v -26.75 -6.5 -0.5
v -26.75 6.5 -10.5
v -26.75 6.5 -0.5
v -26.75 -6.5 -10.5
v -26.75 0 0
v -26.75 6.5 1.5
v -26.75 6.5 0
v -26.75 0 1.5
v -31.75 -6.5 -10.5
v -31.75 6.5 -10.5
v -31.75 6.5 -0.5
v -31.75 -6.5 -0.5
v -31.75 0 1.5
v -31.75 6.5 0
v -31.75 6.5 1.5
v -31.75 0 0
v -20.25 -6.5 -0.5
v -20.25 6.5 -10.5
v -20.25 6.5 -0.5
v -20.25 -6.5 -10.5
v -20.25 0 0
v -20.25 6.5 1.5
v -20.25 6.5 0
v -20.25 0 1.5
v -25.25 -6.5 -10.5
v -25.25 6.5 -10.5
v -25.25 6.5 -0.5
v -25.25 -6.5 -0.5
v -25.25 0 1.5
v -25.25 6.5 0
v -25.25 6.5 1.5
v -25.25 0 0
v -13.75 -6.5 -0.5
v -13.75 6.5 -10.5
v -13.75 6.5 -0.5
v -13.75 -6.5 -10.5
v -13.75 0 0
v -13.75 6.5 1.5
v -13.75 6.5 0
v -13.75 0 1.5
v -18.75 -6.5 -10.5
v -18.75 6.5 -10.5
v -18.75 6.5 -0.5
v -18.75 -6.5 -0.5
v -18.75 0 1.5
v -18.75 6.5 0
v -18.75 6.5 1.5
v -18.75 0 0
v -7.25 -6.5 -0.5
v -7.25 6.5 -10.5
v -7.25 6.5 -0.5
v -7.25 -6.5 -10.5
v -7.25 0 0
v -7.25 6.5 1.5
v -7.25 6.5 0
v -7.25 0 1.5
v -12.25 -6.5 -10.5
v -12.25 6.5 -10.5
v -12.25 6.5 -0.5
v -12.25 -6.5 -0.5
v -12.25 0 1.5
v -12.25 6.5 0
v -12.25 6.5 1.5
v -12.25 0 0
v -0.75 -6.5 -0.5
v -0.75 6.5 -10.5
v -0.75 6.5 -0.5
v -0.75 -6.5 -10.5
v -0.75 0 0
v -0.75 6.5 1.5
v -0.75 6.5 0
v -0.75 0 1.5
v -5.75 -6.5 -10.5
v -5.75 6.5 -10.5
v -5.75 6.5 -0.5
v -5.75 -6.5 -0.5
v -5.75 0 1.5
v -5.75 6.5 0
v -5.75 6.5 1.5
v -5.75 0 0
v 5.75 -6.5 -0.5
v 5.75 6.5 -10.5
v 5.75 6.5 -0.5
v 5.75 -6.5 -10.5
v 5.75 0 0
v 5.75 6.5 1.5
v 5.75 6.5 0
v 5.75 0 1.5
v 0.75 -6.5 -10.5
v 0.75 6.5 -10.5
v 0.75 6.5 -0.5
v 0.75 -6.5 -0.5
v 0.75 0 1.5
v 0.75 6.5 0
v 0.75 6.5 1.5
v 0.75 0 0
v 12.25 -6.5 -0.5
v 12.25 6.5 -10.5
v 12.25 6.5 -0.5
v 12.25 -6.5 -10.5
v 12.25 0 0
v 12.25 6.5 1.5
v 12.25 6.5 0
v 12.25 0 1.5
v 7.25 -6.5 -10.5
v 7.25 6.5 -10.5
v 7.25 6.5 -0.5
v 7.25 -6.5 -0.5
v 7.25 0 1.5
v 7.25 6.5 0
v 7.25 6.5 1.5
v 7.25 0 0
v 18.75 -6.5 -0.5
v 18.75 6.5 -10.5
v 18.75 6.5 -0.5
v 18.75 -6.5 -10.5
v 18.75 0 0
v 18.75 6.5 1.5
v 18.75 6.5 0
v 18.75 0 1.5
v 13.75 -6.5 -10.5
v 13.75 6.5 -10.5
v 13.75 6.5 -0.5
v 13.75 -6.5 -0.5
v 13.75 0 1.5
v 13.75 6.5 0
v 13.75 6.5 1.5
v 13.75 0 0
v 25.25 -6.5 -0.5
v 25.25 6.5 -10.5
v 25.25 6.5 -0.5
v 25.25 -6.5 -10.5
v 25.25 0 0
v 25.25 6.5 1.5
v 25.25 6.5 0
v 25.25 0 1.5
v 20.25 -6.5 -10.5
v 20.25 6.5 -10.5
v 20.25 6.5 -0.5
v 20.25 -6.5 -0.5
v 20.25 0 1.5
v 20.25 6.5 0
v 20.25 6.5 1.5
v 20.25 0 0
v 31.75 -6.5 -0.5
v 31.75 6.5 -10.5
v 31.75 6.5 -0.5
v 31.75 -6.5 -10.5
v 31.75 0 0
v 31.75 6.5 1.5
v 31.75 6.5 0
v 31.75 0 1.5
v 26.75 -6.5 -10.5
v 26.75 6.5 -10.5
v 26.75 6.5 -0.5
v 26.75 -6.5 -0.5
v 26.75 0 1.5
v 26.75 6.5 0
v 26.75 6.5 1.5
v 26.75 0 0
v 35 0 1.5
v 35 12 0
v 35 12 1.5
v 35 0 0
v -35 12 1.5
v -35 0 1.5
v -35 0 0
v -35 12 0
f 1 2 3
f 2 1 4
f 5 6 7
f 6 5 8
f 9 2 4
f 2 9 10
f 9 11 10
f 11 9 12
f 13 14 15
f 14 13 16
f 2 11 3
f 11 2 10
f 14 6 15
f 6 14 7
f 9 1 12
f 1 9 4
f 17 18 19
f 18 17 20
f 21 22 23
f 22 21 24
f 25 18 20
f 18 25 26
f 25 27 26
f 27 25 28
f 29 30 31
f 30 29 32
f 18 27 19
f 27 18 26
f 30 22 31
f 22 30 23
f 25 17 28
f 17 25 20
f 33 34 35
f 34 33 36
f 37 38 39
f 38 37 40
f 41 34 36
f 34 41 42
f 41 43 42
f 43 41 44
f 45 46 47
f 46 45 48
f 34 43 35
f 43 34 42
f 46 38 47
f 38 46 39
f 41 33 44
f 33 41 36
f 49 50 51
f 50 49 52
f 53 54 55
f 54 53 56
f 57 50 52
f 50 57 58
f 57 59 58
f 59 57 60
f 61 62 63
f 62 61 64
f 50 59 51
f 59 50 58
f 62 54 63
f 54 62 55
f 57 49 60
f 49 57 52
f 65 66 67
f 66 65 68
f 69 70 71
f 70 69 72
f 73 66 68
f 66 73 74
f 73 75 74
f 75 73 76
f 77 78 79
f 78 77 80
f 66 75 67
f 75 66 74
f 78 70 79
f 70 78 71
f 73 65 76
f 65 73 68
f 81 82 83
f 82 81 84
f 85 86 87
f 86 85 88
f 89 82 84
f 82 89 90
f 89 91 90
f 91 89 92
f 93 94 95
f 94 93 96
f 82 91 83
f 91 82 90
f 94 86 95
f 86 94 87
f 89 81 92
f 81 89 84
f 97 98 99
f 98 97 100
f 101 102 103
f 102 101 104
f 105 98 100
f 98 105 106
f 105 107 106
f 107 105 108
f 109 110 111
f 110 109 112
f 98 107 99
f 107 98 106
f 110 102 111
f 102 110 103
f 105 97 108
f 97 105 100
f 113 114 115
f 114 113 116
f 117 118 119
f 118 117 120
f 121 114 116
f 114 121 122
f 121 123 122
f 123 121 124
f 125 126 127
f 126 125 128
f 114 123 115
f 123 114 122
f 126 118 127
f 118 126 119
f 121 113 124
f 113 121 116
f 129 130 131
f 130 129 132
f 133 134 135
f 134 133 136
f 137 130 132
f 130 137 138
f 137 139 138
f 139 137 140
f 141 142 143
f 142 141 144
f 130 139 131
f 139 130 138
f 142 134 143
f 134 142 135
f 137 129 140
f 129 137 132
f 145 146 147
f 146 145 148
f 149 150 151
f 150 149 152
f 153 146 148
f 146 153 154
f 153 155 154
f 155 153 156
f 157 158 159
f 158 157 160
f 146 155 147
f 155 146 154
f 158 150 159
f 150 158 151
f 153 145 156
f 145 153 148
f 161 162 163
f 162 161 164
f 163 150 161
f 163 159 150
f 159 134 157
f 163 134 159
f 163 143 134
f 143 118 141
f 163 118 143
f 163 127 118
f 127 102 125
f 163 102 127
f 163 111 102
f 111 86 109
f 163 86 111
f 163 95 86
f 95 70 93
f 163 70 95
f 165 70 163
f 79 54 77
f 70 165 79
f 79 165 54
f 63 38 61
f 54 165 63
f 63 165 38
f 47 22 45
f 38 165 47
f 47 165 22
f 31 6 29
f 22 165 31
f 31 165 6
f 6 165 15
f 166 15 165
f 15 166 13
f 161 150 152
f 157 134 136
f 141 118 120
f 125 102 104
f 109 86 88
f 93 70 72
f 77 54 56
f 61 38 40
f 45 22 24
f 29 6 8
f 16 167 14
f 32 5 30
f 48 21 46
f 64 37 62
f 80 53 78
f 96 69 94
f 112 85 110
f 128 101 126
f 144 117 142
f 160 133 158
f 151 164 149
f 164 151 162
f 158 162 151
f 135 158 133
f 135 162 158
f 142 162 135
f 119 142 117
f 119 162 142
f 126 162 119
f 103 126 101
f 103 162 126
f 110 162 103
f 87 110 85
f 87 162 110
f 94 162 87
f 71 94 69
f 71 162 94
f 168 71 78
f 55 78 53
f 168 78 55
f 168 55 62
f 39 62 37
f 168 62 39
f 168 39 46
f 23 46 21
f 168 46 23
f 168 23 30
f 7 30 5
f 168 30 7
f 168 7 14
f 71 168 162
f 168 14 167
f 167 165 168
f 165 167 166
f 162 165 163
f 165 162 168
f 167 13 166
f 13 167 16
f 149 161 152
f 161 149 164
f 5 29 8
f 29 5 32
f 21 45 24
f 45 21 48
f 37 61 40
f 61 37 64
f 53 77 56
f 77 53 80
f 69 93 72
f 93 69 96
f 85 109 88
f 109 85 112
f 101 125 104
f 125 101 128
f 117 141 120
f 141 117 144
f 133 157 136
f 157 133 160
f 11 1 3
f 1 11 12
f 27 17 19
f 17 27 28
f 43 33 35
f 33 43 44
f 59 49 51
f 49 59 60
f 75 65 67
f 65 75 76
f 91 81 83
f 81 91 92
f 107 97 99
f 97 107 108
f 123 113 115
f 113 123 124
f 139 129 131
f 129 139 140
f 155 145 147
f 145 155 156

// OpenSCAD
// 10-well agarose gel comb - printed lying flat
// Units: mm

// ---------- Parameters ----------
plate_t      = 1.5;    // plate thickness (Z)
spine_l      = 70;     // spine length (X)
spine_w      = 12;     // spine width (Y)
tooth_n      = 10;     // number of teeth
tooth_w      = 5.0;    // tooth width (X)
tooth_l      = 12;     // tooth length (Y)
tooth_h      = 12;     // tooth height from plate top (Z)
gap          = 1.5;    // gap between neighbouring teeth (X)
eps          = 0.5;    // cutter overshoot past faces

$fn = 64;

// ---------- Derived ----------
pitch   = tooth_w + gap;                 // centre-to-centre spacing
x_start = -(tooth_n - 1) * pitch / 2;    // first tooth centre (row centred)

// ---------- Model ----------
difference() {
    union() {
        // Spine (back bar)
        translate([-spine_l / 2, 0, 0])
            cube([spine_l, spine_w, plate_t]);

        // Teeth
        for (i = [0 : tooth_n - 1])
            translate([x_start + i * pitch - tooth_w / 2,
                       -spine_w / 2 - eps,
                       plate_t - tooth_h])
                cube([tooth_w, tooth_l + 2 * eps, tooth_h + eps]);
    }

    // Pockets for the wells (through the plate)
    for (i = [0 : tooth_n - 1])
        translate([x_start + i * pitch - tooth_w / 2,
                   -spine_w / 2 - eps,
                   -eps])
            cube([tooth_w, tooth_l + 2 * eps, plate_t + 2 * eps]);
}
